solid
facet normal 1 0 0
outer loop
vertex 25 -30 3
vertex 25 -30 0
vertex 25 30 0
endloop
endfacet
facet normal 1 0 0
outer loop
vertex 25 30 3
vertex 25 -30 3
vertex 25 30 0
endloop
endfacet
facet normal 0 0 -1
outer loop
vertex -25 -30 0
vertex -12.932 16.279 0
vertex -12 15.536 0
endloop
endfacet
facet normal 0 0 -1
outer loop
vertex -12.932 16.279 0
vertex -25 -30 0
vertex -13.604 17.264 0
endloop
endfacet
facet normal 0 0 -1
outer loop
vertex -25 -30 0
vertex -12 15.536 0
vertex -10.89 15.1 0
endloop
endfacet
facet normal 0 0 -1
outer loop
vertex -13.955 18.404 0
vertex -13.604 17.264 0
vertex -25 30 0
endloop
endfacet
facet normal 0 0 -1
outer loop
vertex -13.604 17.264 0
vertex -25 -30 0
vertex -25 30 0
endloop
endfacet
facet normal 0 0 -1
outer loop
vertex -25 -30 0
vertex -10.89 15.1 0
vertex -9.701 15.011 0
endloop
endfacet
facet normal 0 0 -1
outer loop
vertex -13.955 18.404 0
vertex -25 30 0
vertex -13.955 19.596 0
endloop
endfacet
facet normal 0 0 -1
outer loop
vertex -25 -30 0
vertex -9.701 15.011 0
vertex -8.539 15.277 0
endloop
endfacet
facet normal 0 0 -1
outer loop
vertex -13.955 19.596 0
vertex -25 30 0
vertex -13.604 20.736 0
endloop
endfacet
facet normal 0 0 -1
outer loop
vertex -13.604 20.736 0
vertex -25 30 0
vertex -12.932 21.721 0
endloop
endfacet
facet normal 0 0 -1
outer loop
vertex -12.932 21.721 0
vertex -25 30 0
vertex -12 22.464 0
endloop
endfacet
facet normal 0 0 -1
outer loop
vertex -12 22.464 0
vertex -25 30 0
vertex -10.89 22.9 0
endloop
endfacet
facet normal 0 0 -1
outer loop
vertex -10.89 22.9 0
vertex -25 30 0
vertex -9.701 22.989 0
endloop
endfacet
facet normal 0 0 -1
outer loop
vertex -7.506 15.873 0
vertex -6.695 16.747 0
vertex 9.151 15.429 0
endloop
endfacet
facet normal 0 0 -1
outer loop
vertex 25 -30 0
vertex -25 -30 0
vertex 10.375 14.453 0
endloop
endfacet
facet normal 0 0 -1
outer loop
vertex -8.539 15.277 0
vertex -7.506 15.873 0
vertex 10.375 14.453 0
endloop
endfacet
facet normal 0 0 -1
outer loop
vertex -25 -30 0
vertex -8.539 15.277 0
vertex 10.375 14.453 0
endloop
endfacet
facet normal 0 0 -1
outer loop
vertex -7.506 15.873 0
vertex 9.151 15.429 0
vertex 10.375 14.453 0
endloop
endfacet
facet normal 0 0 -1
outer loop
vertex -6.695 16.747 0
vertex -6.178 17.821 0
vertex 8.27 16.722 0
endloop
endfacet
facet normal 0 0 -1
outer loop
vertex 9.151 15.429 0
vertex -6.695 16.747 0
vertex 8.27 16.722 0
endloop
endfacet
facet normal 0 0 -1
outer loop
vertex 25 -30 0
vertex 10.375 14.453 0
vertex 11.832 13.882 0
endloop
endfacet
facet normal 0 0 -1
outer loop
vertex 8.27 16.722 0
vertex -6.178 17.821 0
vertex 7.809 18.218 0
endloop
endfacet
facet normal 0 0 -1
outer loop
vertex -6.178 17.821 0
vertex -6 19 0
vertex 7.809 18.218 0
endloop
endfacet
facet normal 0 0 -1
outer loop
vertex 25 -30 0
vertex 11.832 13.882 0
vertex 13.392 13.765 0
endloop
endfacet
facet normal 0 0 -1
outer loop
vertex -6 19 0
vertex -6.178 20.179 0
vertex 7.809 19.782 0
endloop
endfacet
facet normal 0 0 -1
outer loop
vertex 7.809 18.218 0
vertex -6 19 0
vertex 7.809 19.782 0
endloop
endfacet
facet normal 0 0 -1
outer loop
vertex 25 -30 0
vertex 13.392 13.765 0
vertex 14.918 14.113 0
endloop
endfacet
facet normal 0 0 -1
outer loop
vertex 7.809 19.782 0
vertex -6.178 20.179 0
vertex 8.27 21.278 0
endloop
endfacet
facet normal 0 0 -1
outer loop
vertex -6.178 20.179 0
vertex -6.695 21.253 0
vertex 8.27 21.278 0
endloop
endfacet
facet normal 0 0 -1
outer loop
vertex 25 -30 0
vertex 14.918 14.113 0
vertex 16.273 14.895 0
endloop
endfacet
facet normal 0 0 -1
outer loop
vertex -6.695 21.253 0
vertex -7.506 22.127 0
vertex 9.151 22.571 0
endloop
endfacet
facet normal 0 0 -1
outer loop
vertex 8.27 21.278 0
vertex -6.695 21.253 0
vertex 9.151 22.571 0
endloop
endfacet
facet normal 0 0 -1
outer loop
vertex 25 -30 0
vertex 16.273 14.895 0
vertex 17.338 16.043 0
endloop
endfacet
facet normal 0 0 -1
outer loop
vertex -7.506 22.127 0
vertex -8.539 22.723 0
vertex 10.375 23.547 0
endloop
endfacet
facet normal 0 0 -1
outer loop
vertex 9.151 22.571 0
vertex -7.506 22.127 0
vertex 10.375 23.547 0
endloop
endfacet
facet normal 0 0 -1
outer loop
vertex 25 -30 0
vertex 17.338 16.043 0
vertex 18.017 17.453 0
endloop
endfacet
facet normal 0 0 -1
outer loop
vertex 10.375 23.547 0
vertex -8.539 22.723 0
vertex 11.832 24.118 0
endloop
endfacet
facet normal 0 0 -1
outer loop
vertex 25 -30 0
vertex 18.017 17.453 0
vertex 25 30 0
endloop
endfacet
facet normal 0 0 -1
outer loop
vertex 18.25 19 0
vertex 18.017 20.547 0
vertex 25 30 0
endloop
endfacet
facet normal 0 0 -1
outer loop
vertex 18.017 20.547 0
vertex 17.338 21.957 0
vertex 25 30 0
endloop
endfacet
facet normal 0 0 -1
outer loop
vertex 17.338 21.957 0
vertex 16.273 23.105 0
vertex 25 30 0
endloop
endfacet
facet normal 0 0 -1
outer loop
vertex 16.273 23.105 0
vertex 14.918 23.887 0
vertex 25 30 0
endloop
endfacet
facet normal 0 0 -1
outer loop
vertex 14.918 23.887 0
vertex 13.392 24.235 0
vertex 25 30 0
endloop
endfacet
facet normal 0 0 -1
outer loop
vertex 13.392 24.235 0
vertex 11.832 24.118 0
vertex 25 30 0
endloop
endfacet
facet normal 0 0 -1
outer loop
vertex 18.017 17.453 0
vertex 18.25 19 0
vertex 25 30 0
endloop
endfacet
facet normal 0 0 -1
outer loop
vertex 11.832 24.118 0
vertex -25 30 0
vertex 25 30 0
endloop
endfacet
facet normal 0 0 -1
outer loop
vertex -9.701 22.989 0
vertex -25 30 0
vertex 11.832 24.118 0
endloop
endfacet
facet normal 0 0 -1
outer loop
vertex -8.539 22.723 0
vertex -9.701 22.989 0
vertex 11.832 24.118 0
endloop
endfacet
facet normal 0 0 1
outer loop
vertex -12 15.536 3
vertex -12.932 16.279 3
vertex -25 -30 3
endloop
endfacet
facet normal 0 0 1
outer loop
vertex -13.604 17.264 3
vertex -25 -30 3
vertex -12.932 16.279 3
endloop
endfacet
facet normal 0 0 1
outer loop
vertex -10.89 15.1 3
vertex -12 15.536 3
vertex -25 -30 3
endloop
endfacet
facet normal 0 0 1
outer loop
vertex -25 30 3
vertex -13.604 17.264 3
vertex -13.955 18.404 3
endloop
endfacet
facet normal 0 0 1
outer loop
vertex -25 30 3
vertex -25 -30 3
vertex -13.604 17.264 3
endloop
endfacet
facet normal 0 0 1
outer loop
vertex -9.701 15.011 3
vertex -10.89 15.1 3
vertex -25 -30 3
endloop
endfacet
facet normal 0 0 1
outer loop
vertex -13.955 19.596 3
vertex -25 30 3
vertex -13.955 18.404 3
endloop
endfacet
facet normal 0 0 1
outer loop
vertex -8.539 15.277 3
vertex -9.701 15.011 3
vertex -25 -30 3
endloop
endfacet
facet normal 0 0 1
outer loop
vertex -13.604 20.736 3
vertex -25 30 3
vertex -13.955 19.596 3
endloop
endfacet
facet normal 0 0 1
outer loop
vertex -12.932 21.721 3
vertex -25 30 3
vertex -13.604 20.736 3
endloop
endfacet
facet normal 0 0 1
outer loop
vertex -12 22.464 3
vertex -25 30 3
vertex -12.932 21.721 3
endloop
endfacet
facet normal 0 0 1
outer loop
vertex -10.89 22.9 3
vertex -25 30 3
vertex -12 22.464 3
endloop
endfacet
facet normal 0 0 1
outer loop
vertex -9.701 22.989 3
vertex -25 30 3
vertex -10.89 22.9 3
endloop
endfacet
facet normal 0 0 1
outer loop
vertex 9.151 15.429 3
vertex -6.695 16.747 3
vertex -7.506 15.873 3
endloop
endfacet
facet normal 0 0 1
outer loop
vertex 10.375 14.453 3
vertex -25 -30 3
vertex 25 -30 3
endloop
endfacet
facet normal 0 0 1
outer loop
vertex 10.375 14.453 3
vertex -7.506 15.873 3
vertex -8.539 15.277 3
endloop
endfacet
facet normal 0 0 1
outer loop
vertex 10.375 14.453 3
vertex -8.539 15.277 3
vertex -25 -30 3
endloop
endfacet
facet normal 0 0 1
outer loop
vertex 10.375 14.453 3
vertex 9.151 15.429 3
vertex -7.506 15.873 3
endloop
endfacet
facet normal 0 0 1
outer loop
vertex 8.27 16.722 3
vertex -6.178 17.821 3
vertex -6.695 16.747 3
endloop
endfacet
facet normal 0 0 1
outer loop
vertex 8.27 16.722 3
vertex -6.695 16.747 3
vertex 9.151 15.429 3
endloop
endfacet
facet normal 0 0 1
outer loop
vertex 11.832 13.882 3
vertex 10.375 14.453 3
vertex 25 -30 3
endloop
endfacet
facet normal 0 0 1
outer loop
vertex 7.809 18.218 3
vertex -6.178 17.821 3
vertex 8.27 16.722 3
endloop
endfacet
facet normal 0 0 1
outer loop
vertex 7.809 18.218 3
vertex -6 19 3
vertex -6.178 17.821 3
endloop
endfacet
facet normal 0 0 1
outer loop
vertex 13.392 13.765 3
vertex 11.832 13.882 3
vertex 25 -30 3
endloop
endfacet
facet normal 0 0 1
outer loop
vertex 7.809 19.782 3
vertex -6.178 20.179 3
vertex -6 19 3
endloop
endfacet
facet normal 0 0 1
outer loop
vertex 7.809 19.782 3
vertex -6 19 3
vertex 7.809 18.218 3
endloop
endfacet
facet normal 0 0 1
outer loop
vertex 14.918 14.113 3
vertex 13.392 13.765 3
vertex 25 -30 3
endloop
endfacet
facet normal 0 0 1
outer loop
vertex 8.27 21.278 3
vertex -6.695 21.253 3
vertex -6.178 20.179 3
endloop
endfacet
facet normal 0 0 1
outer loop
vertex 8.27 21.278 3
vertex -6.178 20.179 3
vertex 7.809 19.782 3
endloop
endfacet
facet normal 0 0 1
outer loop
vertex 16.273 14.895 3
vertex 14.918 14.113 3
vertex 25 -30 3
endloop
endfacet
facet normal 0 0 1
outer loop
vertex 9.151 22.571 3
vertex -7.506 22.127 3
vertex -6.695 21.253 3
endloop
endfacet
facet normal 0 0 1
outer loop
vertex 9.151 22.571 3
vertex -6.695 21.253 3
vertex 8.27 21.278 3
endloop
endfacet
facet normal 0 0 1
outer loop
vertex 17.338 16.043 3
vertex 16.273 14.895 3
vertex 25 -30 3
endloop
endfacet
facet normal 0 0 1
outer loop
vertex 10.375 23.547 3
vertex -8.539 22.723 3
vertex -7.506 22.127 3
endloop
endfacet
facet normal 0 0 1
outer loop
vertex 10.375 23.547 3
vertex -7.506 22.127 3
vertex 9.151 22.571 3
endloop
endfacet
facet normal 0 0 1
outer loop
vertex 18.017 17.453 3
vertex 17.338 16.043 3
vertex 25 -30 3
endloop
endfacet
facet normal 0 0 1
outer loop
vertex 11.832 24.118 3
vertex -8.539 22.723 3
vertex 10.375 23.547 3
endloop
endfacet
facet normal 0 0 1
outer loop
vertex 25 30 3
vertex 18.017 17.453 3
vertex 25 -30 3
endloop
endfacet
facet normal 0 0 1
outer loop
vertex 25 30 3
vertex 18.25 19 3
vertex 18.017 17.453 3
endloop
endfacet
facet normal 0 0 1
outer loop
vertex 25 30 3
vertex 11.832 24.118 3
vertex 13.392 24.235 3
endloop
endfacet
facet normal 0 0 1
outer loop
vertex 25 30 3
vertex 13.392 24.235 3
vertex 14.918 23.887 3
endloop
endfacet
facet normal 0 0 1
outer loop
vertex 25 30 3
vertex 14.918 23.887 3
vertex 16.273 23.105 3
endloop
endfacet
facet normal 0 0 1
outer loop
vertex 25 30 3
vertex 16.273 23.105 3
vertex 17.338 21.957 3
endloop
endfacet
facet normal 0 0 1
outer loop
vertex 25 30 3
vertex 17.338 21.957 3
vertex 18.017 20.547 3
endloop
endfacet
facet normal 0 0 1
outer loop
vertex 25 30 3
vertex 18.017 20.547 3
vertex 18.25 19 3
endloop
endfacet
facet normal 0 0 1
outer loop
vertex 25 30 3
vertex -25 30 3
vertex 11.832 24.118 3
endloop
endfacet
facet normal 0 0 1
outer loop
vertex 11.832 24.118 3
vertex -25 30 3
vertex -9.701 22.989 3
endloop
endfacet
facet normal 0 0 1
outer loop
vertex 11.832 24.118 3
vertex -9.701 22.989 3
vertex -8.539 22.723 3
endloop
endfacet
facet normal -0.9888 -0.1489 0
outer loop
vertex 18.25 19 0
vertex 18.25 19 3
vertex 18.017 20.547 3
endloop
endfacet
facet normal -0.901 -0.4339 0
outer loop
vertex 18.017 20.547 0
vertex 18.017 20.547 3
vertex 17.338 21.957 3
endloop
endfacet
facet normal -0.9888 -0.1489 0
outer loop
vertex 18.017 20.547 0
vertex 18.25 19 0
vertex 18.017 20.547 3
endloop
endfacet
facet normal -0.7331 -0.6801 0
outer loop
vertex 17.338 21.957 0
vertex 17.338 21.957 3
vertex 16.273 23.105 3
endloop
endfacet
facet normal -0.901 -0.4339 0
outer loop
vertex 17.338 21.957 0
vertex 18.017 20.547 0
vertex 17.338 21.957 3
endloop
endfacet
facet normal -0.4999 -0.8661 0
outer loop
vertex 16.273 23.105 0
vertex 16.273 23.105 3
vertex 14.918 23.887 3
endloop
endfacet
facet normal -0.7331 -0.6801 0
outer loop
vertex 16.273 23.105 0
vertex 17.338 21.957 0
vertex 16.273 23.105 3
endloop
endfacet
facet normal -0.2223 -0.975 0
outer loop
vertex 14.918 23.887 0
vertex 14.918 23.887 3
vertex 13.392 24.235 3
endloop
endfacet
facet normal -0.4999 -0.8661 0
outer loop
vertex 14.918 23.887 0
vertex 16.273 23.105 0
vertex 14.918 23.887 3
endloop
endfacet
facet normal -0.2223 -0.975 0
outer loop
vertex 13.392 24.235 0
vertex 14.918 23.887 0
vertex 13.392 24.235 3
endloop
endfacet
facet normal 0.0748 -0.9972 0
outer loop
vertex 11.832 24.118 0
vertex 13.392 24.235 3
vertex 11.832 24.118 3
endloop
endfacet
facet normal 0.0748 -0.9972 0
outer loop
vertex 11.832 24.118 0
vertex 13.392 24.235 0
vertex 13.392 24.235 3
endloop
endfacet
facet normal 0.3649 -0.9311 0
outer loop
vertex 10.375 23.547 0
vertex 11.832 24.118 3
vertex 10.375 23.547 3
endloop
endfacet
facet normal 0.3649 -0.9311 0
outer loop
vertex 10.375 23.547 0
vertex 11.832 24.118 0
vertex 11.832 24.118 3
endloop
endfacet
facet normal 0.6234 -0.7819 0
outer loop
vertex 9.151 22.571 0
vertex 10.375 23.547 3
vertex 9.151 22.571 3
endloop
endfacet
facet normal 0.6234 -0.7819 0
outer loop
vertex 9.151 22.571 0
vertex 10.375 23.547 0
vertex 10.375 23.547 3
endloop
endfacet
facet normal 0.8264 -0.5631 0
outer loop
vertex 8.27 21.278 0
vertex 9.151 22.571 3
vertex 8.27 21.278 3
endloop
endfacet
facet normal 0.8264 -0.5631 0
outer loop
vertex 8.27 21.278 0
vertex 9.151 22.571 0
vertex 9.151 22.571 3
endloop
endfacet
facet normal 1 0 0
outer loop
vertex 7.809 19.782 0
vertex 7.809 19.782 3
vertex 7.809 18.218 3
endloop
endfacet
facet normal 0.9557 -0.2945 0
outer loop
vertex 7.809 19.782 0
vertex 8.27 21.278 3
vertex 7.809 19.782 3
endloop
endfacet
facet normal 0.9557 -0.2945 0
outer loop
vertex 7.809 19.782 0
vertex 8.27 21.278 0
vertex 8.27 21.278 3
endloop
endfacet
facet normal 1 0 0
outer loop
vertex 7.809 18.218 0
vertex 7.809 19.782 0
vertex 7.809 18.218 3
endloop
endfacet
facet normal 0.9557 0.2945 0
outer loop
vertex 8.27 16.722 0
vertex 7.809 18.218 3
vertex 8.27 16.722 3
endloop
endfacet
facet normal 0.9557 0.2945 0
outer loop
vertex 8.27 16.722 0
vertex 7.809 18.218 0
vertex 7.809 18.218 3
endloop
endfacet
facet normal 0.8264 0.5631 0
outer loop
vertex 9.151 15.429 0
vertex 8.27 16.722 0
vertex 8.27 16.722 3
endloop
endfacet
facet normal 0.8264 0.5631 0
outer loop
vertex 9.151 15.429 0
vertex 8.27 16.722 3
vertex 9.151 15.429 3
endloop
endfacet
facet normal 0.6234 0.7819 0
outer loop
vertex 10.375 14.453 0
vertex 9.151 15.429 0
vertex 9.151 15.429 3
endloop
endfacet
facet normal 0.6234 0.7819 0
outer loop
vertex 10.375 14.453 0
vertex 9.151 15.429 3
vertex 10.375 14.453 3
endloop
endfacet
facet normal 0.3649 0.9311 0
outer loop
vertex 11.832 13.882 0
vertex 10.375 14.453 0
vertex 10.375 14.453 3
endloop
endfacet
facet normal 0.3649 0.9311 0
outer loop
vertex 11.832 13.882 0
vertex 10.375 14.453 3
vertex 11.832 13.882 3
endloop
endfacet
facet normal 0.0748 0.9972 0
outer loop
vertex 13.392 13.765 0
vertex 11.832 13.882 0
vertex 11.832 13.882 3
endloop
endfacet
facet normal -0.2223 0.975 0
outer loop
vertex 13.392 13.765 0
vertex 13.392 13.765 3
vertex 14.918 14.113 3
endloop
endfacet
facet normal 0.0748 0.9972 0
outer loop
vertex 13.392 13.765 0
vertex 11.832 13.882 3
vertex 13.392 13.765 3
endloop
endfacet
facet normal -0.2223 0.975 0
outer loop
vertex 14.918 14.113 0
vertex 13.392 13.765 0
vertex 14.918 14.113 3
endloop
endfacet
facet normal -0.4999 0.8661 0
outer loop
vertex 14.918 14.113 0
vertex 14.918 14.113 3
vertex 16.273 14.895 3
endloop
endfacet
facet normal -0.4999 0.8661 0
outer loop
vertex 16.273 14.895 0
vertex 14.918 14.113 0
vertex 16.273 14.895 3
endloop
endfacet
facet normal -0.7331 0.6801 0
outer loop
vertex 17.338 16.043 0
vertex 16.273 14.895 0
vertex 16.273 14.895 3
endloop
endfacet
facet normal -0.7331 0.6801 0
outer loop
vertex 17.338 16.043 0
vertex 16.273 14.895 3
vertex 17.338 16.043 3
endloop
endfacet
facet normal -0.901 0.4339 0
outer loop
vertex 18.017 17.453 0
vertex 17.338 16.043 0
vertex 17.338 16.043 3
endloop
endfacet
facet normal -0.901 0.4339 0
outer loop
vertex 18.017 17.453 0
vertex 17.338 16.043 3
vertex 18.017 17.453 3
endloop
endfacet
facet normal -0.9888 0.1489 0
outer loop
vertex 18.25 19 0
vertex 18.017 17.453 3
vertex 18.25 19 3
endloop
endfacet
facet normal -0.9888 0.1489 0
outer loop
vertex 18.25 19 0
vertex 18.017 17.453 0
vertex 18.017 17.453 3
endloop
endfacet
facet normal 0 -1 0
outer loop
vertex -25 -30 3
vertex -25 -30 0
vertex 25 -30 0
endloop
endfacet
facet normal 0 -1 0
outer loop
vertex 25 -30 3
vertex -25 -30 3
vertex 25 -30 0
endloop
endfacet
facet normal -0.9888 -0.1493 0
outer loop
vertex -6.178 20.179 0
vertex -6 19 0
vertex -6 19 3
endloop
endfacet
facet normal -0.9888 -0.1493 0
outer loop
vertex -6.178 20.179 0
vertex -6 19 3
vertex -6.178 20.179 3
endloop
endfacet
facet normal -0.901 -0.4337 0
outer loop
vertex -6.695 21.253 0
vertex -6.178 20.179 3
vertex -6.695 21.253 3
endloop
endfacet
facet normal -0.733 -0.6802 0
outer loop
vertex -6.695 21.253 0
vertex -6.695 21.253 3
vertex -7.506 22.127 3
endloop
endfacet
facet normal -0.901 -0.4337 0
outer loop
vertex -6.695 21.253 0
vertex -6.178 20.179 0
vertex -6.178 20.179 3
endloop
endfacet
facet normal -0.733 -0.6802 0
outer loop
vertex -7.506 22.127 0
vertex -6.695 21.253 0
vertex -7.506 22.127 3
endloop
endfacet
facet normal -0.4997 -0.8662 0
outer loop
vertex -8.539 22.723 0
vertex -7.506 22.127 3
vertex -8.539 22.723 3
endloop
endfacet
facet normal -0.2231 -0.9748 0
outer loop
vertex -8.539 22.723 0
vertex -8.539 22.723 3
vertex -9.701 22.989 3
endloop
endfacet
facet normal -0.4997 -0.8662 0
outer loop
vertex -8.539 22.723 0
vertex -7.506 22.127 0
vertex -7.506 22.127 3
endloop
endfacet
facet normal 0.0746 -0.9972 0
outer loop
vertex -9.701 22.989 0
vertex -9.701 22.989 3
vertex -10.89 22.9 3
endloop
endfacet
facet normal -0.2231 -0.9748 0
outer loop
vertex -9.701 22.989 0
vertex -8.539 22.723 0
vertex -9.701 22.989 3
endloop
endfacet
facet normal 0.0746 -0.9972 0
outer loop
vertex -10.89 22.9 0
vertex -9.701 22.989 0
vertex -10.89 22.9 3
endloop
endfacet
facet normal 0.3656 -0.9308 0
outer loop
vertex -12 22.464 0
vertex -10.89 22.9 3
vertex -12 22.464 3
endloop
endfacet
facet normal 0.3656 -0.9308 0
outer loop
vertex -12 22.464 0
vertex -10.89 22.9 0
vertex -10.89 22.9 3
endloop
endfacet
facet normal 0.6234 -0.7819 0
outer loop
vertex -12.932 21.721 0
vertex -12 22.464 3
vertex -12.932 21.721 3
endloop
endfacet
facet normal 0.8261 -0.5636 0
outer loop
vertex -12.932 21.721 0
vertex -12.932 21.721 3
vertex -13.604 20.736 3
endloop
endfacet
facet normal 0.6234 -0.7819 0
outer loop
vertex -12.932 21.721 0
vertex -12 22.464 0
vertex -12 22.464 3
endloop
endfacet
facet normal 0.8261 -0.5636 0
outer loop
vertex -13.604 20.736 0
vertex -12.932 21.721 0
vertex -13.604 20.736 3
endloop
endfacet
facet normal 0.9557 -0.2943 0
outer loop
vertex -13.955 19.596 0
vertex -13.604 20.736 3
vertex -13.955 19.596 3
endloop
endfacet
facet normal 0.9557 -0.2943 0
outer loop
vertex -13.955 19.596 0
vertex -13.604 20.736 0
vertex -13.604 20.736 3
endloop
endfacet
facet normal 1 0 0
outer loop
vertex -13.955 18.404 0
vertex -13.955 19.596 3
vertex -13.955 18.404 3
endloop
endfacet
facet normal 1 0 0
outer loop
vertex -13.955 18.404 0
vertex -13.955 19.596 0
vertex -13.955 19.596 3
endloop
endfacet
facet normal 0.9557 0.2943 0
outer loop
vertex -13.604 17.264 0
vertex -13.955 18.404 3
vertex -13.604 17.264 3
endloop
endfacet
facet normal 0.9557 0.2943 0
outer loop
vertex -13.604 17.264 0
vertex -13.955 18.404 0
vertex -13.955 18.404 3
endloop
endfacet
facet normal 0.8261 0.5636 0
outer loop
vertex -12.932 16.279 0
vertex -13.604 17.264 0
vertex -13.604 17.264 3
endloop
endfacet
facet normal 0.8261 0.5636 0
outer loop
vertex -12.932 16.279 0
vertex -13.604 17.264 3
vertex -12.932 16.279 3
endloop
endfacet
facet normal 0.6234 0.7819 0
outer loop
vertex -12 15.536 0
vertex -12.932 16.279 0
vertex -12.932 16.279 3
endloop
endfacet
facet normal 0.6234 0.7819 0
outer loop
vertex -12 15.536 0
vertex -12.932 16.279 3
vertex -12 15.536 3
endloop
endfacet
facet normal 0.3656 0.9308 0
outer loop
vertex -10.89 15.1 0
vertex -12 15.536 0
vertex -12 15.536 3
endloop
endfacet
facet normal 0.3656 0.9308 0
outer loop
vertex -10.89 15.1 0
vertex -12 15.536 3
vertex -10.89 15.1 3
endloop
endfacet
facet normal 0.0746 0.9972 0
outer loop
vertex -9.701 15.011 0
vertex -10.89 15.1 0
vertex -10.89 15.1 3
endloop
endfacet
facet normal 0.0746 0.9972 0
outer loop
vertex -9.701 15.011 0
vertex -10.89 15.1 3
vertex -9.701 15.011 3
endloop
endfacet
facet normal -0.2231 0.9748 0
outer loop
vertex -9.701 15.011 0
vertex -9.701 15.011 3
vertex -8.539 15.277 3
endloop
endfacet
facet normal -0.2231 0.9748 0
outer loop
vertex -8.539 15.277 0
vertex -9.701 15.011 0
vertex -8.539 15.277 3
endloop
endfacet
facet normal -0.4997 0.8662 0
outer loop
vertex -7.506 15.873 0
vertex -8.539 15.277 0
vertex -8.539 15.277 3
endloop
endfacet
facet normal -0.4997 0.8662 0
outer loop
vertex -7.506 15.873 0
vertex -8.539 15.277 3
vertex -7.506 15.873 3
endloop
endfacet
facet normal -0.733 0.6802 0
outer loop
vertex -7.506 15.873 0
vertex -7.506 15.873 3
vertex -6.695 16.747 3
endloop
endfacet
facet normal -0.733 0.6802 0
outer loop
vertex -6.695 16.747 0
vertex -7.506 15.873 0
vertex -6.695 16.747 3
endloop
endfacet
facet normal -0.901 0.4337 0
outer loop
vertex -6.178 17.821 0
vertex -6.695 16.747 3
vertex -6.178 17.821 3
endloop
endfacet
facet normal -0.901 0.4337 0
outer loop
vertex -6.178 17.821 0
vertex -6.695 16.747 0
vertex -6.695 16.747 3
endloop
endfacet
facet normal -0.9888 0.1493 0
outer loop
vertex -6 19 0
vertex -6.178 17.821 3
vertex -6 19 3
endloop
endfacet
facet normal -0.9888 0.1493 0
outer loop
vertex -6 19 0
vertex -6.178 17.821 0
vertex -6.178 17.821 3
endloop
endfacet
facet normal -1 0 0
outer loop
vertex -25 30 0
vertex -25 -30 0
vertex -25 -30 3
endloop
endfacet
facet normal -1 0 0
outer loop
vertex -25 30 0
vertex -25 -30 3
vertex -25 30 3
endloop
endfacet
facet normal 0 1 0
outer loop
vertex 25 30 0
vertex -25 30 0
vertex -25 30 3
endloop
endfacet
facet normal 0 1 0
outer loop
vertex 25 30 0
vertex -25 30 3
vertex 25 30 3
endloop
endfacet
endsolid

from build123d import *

# Parameters (mm, degrees)
SKETCH1_W           = 50
SKETCH1_H           = 60
SKETCH1_R           = 4
BOSS_EXTRUDE1_DEPTH = 3
SKETCH2_R           = 5.25
CUT_EXTRUDE2_DEPTH  = 40.166312055


with BuildPart() as part:
    # Sketch1 → Boss-Extrude1 (new body)
    with BuildSketch(Plane.XY):
        Rectangle(SKETCH1_W, SKETCH1_H)
        with Locations((-10, 19)):
            Circle(SKETCH1_R, mode=Mode.SUBTRACT)
    extrude(amount=BOSS_EXTRUDE1_DEPTH)

    # Sketch2 → Cut-Extrude2 (cut, through all)
    with BuildSketch(Plane.XY):
        with Locations((13, 19)):
            Circle(SKETCH2_R)
    extrude(amount=CUT_EXTRUDE2_DEPTH, mode=Mode.SUBTRACT)


solid = part.part
